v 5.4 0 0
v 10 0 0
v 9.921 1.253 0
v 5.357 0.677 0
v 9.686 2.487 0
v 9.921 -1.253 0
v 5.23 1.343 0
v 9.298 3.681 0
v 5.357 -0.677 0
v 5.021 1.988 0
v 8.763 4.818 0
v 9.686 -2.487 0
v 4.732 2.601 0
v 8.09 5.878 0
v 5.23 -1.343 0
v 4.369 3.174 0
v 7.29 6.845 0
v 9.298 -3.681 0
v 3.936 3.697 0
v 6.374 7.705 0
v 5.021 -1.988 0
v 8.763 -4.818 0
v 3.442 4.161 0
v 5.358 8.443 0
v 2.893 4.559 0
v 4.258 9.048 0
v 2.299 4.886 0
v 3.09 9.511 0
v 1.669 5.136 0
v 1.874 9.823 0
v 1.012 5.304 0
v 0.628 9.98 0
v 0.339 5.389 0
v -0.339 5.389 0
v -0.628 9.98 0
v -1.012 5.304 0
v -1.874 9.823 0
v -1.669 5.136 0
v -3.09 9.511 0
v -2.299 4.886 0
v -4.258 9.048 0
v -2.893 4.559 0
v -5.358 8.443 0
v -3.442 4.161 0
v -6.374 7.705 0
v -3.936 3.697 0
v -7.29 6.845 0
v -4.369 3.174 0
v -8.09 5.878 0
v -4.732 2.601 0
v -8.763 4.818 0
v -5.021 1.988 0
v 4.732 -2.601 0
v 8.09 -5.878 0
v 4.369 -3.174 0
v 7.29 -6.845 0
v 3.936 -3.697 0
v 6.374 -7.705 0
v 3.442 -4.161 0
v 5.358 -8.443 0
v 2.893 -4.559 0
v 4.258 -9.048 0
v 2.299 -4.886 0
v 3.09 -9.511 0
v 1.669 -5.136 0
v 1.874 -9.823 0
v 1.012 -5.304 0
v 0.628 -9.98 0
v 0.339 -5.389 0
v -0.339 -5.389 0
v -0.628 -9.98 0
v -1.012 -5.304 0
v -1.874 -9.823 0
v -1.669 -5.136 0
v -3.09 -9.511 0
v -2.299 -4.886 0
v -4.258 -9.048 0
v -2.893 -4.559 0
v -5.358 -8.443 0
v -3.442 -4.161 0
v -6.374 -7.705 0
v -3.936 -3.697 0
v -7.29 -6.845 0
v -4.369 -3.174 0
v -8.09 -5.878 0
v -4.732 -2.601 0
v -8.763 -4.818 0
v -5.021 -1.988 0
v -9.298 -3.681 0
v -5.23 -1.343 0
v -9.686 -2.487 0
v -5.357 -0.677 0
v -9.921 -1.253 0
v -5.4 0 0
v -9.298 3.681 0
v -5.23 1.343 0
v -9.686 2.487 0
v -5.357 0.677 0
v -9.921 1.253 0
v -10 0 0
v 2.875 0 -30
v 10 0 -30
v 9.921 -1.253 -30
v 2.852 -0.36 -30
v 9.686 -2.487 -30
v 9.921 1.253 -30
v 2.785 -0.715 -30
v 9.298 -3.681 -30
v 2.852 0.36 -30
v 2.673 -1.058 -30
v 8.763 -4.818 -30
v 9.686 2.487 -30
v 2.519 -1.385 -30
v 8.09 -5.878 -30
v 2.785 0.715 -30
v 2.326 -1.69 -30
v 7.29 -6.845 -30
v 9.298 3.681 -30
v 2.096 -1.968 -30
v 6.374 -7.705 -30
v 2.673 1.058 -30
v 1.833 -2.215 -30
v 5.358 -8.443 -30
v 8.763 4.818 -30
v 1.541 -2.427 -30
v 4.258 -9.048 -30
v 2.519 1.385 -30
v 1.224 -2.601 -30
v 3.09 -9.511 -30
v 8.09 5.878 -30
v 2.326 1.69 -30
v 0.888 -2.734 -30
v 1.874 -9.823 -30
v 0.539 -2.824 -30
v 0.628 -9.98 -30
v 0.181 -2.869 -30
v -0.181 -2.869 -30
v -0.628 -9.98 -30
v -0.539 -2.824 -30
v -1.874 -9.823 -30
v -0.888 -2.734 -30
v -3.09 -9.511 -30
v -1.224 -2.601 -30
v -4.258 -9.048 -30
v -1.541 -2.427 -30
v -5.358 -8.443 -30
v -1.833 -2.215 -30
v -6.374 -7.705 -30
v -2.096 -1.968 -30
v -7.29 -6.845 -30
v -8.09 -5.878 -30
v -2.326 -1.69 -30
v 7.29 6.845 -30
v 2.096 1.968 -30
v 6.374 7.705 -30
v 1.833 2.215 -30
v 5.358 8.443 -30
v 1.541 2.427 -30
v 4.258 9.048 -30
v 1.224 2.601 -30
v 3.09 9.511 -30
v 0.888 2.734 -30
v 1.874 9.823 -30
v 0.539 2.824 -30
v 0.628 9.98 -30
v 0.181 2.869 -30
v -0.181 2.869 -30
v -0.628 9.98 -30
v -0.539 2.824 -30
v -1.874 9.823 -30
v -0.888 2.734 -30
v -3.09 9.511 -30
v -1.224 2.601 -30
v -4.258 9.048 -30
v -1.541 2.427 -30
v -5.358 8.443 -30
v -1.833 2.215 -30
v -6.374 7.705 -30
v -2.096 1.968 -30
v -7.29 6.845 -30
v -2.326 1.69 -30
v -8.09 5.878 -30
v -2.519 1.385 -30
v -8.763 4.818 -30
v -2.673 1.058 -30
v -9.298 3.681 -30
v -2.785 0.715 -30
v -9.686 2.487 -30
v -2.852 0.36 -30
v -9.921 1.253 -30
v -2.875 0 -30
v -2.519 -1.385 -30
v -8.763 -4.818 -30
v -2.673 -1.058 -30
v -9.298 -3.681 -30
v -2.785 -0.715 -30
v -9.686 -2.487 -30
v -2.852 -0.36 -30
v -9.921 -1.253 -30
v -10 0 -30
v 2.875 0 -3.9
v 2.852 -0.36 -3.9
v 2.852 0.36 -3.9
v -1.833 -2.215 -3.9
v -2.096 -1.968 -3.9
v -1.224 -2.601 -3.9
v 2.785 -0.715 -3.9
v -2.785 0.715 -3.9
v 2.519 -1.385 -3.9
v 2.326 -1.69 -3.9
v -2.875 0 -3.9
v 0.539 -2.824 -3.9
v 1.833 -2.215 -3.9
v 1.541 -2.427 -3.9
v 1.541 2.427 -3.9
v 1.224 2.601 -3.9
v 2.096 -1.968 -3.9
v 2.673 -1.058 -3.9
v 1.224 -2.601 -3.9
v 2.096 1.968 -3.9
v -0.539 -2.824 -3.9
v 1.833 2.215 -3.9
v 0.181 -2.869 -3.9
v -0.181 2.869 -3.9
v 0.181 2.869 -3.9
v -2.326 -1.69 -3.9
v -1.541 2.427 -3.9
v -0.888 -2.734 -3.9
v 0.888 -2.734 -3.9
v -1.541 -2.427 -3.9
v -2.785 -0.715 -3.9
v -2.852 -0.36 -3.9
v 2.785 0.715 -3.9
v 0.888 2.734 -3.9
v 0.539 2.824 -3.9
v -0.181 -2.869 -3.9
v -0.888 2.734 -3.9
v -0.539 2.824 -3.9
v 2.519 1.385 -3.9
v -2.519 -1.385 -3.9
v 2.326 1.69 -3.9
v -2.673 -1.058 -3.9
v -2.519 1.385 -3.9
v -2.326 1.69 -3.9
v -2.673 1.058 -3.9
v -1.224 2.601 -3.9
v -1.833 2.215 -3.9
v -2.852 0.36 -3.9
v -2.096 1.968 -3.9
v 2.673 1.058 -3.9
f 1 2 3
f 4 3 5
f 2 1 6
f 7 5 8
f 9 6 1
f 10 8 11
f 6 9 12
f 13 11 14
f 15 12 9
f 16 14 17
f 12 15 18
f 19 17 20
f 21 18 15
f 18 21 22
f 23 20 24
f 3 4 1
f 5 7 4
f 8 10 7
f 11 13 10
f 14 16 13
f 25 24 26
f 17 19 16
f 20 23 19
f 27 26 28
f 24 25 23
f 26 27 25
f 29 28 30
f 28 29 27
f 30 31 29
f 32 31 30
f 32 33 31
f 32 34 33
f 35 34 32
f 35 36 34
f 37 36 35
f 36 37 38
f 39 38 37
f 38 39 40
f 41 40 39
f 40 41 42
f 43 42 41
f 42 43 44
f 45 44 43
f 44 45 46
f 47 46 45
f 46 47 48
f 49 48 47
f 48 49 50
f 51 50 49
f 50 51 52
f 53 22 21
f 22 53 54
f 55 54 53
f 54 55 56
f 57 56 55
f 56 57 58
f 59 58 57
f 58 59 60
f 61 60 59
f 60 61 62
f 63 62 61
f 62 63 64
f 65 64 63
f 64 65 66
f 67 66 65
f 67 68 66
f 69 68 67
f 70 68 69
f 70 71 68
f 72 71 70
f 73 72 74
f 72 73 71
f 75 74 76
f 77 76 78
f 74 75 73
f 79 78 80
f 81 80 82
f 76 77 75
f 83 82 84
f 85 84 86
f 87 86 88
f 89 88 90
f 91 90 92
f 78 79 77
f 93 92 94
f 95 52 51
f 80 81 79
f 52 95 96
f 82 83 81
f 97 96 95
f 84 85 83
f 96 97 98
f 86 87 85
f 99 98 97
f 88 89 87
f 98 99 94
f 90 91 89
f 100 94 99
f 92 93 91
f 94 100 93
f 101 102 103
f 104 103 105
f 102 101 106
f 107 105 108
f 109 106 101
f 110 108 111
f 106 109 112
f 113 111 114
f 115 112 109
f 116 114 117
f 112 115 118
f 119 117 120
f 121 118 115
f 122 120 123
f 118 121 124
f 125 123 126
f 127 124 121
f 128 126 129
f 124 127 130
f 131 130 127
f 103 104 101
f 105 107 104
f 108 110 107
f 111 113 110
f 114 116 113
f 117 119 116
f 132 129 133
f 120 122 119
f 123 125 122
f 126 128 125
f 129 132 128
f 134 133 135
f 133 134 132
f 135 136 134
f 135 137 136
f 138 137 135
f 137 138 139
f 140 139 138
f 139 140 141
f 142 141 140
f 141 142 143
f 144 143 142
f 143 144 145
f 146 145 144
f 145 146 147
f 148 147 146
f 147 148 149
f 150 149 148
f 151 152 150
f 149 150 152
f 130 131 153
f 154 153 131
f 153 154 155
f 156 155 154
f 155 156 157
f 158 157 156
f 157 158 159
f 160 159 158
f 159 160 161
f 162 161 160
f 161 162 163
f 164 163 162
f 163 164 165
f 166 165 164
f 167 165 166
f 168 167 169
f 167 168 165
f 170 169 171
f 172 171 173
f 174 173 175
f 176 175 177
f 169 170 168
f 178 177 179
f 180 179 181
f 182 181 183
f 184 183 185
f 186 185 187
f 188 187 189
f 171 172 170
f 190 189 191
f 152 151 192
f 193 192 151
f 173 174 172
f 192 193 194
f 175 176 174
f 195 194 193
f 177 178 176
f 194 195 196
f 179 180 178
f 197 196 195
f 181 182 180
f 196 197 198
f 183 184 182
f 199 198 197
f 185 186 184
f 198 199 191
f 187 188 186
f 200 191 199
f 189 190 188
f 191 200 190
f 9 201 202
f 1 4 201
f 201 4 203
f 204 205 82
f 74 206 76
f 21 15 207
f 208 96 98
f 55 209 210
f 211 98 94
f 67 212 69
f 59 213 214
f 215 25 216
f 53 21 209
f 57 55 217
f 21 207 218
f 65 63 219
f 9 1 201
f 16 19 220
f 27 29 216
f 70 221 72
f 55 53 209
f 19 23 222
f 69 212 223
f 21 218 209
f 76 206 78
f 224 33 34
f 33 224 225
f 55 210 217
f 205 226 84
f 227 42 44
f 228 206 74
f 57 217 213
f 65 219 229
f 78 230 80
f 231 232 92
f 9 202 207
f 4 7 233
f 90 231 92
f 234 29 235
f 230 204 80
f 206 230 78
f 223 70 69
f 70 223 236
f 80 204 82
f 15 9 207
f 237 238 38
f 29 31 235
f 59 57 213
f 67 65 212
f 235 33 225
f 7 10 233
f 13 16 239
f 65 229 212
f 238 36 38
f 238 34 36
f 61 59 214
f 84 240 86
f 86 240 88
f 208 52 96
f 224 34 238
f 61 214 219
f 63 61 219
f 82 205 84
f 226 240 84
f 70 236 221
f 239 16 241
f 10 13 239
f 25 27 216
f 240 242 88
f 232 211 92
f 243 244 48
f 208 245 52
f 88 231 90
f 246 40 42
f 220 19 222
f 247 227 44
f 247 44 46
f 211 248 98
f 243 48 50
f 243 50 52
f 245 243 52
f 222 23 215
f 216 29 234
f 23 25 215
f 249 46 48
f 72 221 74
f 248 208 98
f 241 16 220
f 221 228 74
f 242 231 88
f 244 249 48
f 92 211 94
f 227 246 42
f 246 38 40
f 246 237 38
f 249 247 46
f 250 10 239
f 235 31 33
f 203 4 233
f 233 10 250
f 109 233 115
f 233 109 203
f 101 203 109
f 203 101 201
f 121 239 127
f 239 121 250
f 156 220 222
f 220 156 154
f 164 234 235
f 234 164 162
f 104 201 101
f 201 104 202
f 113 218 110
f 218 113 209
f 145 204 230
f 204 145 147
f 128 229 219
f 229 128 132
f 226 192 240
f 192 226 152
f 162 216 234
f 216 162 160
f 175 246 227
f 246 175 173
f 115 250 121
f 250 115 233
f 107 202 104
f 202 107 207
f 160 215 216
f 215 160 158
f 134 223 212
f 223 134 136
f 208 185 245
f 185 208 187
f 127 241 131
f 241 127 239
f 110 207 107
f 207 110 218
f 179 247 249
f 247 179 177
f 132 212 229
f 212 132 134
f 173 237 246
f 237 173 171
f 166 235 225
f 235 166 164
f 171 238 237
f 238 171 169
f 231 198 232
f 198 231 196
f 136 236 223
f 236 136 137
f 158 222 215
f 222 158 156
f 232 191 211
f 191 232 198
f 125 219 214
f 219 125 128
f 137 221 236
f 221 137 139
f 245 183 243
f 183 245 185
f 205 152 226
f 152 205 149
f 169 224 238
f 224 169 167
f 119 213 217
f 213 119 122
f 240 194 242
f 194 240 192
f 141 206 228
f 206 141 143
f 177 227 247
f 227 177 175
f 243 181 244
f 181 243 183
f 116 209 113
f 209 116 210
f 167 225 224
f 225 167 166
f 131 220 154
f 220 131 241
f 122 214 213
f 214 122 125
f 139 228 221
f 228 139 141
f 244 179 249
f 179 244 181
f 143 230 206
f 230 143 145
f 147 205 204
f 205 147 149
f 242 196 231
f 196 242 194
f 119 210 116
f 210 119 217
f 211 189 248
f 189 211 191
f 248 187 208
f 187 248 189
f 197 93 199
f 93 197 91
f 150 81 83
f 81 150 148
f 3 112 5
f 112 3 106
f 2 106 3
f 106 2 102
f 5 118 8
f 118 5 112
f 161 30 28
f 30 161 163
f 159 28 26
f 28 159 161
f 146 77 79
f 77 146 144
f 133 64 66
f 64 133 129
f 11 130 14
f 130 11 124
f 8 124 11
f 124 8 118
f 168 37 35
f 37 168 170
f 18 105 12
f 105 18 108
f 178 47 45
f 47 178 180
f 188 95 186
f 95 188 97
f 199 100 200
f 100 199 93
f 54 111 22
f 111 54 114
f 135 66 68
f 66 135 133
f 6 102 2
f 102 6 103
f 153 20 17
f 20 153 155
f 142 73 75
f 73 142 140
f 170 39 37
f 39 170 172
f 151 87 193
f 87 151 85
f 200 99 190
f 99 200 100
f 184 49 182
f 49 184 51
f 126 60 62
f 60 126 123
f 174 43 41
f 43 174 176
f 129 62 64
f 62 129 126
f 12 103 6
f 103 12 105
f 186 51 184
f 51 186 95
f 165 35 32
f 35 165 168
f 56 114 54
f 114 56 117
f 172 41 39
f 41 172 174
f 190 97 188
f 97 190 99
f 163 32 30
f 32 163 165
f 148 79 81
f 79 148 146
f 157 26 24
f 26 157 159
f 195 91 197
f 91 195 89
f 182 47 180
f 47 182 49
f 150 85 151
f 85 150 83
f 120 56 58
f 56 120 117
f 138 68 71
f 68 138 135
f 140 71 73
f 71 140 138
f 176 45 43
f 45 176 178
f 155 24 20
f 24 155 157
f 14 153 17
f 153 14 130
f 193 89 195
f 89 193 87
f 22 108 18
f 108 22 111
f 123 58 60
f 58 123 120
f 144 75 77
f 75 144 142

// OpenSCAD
$fn = 50;


difference() {
	union() {
		translate(v = [0, 0, -30.0000000000]) {
			cylinder(h = 30, r = 10.0000000000);
		}
		cylinder(h = 0, r = 13.0000000000);
	}
	union() {
		translate(v = [0, 0, 0]) {
			rotate(a = [0, 0, 0]) {
				difference() {
					union() {
						#translate(v = [0, 0, -30.0000000000]) {
							cylinder(h = 30, r = 2.6000000000);
						}
						#translate(v = [0, 0, -3.9000000000]) {
							cylinder(h = 3.9000000000, r = 10.0000000000, r1 = 2.8750000000, r2 = 5.4000000000);
						}
						#translate(v = [0, 0, -30.0000000000]) {
							cylinder(h = 30, r = 2.8750000000);
						}
						#translate(v = [0, 0, -30.0000000000]) {
							cylinder(h = 30, r = 2.6000000000);
						}
					}
					union();
				}
			}
		}
	}
}
